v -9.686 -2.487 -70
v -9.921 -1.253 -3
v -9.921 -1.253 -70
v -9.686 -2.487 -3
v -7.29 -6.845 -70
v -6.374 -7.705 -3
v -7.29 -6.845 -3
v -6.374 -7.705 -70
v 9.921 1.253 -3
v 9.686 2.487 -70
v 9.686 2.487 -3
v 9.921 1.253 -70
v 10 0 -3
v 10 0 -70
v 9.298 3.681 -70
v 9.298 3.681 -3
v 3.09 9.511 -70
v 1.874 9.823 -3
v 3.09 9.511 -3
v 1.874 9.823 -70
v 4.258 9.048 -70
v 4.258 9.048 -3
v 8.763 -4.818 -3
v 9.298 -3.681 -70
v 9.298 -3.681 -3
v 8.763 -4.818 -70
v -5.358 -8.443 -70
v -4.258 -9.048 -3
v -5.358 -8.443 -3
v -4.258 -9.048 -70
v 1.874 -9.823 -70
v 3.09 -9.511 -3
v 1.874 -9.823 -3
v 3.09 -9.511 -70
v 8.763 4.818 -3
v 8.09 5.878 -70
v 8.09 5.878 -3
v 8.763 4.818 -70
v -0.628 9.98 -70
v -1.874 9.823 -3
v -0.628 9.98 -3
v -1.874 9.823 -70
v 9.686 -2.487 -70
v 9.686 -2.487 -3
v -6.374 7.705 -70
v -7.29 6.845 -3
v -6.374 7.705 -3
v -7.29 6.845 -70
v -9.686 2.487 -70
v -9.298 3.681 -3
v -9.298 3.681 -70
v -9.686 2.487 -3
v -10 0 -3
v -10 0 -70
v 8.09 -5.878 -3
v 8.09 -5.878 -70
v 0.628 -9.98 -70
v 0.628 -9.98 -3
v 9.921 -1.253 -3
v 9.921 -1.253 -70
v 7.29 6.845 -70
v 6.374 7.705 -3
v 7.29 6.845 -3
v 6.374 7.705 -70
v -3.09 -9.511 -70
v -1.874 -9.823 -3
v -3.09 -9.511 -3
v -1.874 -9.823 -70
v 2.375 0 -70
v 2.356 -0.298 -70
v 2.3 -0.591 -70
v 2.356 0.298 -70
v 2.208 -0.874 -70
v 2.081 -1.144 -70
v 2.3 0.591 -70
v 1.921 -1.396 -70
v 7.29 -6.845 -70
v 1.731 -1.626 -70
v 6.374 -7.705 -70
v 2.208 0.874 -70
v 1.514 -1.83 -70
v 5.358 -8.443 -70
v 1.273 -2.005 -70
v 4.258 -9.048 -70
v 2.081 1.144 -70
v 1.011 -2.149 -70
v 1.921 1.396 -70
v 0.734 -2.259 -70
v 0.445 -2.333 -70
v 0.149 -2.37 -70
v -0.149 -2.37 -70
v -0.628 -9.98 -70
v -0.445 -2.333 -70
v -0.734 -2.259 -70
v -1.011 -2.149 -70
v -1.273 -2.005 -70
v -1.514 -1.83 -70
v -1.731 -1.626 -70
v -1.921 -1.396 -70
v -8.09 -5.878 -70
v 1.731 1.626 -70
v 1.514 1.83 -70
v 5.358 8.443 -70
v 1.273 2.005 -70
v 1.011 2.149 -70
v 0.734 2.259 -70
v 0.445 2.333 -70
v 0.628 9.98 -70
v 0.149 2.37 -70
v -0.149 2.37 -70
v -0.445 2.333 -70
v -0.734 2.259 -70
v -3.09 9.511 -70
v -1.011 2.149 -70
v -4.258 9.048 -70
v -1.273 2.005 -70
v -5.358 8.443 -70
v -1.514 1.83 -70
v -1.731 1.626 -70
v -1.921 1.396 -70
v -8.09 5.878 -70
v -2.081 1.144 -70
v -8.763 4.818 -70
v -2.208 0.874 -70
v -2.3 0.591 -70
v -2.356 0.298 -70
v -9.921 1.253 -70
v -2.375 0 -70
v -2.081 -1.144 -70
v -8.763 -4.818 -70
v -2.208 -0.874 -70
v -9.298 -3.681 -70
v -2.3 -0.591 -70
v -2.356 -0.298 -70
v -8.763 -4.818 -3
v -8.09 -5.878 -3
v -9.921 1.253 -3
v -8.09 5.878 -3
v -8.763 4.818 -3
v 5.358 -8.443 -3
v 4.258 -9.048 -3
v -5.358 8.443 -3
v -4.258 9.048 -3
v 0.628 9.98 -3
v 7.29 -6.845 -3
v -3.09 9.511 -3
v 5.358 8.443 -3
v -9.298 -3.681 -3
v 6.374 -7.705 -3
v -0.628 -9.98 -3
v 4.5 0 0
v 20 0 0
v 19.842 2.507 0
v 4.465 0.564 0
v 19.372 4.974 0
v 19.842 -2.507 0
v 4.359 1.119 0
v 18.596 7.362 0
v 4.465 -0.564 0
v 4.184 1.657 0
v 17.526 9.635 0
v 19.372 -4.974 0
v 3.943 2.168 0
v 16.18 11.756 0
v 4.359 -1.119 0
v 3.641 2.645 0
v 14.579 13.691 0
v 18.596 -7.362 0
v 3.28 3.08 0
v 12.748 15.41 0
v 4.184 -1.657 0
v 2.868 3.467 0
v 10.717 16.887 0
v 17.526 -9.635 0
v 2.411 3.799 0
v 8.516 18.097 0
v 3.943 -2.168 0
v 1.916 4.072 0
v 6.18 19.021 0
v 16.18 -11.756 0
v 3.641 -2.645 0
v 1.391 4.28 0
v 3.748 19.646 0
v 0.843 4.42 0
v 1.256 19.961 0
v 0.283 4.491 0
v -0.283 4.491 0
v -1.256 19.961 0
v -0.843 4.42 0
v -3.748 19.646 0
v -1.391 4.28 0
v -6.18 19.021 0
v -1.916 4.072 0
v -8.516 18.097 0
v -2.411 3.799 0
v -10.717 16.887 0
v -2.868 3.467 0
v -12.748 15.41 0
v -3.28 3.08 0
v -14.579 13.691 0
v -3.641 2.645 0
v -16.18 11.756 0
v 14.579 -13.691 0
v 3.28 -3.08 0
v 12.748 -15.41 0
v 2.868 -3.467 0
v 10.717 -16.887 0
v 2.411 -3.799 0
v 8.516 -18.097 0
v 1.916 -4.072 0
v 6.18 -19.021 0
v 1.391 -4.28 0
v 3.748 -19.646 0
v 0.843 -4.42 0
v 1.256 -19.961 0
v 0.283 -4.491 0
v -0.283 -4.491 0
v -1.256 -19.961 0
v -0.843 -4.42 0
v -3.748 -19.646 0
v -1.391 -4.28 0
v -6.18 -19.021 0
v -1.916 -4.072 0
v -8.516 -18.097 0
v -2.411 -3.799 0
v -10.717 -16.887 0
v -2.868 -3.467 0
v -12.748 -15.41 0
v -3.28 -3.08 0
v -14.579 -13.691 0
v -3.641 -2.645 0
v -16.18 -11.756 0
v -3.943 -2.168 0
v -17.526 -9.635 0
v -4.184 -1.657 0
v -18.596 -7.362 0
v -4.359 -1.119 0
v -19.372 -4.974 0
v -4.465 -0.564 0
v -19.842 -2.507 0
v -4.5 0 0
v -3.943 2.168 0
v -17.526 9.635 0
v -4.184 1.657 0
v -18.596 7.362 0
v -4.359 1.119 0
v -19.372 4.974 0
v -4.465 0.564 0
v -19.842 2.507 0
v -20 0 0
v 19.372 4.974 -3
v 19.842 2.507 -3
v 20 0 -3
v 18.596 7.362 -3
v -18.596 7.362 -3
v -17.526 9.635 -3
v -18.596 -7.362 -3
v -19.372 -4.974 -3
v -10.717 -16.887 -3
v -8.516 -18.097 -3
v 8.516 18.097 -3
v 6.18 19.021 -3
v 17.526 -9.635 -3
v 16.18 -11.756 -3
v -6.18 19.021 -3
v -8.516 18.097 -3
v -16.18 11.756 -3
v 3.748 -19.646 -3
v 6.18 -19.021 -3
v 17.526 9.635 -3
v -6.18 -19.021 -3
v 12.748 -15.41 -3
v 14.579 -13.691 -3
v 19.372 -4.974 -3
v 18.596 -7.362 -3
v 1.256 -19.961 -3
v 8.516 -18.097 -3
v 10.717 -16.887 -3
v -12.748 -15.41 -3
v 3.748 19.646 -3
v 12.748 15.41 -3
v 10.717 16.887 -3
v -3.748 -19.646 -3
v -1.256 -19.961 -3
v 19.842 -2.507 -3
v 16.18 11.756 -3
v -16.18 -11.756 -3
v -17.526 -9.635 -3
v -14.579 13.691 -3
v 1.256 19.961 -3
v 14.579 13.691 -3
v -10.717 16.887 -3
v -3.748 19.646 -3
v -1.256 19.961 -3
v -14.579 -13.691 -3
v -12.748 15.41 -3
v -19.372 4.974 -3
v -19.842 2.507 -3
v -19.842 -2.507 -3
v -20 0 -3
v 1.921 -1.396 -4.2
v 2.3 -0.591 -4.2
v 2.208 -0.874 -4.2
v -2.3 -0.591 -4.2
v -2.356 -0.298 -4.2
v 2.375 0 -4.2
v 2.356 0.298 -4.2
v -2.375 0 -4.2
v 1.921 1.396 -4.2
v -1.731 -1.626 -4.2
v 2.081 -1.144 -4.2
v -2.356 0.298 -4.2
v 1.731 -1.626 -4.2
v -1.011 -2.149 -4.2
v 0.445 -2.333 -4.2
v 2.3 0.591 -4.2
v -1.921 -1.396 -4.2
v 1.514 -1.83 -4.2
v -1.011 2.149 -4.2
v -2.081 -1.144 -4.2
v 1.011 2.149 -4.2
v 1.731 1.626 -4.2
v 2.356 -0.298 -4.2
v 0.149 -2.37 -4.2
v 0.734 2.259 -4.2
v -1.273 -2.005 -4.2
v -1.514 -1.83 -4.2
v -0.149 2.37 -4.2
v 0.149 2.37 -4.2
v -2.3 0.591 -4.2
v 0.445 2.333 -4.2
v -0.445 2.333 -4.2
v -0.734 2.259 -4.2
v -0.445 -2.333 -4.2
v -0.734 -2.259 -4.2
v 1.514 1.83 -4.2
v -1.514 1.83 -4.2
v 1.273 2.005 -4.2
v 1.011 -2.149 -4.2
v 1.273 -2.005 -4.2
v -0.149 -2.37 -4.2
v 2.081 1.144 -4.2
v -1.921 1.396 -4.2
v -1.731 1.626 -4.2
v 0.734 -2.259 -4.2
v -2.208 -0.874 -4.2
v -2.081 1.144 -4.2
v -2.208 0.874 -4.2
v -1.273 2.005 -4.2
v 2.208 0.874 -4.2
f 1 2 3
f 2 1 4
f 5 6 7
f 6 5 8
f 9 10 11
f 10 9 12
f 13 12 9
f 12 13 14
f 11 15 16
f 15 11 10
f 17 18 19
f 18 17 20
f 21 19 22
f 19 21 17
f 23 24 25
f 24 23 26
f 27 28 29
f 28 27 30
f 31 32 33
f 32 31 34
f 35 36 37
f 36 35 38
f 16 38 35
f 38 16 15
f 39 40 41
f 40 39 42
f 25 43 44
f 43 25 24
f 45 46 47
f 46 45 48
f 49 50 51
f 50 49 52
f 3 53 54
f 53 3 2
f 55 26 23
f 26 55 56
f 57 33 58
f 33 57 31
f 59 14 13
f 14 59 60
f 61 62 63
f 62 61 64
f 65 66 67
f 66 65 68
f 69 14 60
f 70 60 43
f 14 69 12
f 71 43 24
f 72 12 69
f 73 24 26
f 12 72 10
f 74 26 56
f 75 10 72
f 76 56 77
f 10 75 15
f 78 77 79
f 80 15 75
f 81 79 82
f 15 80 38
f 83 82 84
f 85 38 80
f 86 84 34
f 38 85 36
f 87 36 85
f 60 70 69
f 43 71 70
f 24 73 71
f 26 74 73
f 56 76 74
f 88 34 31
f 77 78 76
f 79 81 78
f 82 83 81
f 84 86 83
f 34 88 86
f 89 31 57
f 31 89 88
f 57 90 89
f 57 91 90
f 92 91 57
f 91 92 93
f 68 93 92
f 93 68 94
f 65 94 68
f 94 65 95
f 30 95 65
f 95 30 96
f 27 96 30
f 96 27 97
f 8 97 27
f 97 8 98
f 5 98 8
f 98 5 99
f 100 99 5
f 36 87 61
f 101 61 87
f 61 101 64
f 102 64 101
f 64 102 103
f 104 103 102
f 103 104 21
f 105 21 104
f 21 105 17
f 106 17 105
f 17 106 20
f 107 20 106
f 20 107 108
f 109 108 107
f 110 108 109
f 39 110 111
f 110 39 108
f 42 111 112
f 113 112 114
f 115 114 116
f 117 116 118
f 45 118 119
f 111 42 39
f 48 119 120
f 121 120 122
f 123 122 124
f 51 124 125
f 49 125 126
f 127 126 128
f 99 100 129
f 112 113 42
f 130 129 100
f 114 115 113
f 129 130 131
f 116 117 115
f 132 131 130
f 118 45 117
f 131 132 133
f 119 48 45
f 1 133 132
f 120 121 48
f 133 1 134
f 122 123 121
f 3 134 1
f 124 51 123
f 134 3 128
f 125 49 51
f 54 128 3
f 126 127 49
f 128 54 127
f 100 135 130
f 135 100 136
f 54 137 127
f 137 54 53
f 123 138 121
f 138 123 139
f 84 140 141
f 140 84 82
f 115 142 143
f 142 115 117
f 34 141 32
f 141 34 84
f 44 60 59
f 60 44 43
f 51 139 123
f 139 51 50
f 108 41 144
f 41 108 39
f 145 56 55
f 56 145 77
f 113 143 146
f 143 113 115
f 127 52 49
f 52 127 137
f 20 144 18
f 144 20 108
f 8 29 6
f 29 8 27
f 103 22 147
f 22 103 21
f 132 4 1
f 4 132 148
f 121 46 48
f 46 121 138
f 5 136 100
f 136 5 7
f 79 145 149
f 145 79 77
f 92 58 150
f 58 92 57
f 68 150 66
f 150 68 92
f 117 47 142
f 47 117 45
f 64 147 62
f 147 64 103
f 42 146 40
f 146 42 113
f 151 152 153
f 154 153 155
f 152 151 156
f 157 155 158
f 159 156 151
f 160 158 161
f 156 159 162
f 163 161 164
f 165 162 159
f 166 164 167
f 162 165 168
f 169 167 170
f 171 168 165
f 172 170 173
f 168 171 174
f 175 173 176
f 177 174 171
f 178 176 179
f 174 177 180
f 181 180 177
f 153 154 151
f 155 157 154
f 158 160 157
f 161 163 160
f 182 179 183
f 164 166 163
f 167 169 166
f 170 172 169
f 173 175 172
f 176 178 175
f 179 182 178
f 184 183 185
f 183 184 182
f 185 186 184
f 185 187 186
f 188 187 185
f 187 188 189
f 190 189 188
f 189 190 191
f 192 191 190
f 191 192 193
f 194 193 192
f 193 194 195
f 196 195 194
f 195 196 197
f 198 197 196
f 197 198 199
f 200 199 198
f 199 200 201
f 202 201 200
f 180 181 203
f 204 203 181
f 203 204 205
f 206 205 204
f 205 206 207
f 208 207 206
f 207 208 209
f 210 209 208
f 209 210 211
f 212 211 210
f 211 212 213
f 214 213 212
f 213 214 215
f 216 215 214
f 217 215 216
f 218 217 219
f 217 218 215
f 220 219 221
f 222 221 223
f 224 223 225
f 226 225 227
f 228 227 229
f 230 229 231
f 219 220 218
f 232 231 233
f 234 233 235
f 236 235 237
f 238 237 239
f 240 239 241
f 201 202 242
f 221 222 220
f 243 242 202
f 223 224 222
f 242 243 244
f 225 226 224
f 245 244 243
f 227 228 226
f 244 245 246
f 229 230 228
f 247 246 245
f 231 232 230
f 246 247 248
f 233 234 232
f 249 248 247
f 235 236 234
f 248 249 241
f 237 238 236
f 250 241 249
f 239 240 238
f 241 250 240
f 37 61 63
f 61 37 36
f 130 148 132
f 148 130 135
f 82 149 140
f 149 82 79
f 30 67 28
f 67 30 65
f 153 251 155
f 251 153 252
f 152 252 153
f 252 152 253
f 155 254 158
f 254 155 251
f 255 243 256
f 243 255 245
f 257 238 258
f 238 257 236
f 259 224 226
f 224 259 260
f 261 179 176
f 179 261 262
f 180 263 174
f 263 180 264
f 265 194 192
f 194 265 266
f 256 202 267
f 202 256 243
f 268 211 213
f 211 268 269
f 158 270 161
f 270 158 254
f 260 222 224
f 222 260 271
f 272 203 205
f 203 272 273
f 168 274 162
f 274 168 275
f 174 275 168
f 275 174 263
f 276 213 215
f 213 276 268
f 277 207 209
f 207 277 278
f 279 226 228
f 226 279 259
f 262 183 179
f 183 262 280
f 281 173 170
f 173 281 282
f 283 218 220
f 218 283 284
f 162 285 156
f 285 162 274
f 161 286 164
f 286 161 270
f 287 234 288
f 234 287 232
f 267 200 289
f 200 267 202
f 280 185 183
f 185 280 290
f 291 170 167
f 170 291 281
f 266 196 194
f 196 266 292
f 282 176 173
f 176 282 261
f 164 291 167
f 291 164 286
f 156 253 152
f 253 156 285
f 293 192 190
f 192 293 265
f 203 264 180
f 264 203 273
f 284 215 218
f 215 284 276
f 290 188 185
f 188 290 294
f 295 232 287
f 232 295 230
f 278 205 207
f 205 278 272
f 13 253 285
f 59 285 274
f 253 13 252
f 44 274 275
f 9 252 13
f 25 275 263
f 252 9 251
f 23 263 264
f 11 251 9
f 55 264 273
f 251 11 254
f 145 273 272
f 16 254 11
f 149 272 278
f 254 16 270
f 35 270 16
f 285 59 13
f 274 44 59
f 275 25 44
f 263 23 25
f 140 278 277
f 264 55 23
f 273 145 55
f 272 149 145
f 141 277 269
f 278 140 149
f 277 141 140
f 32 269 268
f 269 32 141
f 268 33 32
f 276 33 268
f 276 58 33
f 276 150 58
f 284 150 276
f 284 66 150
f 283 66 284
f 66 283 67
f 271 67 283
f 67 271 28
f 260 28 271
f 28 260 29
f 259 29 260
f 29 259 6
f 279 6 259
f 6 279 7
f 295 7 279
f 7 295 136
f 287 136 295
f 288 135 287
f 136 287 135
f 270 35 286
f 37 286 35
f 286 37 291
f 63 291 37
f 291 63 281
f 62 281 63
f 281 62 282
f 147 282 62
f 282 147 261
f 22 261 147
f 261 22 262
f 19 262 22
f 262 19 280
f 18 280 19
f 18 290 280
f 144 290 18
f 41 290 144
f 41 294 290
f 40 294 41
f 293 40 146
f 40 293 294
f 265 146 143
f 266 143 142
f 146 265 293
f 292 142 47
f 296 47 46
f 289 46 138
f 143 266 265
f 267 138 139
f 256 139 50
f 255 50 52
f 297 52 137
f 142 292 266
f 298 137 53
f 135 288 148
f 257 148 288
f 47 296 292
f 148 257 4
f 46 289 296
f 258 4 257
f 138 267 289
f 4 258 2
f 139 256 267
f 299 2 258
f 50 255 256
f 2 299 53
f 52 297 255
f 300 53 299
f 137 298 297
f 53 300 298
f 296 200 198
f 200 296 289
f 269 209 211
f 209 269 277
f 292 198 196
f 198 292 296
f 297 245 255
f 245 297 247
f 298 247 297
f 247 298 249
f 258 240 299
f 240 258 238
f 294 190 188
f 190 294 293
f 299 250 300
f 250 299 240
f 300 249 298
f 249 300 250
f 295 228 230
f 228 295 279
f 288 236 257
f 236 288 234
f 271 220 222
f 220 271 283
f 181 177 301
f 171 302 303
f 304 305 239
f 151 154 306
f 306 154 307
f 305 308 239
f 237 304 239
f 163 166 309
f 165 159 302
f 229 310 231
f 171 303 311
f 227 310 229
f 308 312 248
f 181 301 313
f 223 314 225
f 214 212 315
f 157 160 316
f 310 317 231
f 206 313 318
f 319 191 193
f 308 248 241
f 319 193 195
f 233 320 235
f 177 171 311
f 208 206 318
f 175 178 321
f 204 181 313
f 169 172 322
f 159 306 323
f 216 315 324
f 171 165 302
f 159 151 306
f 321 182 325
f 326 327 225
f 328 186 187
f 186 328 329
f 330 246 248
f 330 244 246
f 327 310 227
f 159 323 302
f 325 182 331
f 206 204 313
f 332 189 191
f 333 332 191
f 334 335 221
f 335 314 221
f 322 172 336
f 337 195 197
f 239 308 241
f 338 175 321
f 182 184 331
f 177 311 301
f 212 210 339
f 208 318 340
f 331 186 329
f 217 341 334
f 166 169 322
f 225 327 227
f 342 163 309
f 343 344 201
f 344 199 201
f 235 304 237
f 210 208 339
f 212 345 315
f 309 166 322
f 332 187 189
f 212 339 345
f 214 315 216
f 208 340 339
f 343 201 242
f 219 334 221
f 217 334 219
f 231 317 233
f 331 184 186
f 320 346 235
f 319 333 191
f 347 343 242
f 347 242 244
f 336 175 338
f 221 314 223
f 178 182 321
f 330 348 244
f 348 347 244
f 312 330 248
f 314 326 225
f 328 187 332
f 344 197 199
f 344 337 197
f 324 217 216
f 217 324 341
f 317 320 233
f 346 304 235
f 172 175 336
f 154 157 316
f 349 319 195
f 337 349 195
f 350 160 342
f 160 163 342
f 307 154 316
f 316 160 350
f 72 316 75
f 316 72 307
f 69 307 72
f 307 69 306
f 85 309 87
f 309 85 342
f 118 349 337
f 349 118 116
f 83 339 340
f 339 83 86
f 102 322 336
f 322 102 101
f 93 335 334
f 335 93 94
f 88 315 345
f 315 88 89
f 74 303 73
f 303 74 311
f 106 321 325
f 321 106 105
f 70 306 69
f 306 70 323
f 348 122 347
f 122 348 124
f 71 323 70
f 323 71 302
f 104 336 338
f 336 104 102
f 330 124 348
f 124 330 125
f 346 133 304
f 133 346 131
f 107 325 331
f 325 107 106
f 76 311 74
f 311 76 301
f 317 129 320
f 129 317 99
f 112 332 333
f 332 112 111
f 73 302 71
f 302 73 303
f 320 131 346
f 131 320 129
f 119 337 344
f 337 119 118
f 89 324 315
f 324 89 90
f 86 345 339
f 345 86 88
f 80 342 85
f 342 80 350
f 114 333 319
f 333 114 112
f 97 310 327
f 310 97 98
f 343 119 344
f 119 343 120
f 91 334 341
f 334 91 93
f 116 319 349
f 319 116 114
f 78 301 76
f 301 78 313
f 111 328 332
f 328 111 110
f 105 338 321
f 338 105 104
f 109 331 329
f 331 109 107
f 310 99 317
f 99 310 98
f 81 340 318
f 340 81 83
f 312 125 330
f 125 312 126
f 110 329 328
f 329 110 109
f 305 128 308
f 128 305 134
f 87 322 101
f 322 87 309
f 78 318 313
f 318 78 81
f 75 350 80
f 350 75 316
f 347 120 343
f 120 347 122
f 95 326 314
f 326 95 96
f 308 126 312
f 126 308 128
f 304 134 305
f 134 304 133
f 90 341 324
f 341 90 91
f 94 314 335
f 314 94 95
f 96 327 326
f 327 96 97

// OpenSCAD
$fn = 50;


difference() {
	union() {
		translate(v = [0, 0, -70.0000000000]) {
			cylinder(h = 70, r = 10.0000000000);
		}
		translate(v = [0, 0, -3.0000000000]) {
			cylinder(h = 3, r = 20.0000000000);
		}
	}
	union() {
		translate(v = [0, 0, 0]) {
			rotate(a = [0, 0, 0]) {
				difference() {
					union() {
						#translate(v = [0, 0, -70.0000000000]) {
							cylinder(h = 70, r = 2.2500000000);
						}
						#translate(v = [0, 0, -4.2000000000]) {
							cylinder(h = 4.2000000000, r = 10.0000000000, r1 = 2.3750000000, r2 = 4.5000000000);
						}
						#translate(v = [0, 0, -70.0000000000]) {
							cylinder(h = 70, r = 2.3750000000);
						}
						#translate(v = [0, 0, -70.0000000000]) {
							cylinder(h = 70, r = 2.2500000000);
						}
					}
					union();
				}
			}
		}
	}
}
